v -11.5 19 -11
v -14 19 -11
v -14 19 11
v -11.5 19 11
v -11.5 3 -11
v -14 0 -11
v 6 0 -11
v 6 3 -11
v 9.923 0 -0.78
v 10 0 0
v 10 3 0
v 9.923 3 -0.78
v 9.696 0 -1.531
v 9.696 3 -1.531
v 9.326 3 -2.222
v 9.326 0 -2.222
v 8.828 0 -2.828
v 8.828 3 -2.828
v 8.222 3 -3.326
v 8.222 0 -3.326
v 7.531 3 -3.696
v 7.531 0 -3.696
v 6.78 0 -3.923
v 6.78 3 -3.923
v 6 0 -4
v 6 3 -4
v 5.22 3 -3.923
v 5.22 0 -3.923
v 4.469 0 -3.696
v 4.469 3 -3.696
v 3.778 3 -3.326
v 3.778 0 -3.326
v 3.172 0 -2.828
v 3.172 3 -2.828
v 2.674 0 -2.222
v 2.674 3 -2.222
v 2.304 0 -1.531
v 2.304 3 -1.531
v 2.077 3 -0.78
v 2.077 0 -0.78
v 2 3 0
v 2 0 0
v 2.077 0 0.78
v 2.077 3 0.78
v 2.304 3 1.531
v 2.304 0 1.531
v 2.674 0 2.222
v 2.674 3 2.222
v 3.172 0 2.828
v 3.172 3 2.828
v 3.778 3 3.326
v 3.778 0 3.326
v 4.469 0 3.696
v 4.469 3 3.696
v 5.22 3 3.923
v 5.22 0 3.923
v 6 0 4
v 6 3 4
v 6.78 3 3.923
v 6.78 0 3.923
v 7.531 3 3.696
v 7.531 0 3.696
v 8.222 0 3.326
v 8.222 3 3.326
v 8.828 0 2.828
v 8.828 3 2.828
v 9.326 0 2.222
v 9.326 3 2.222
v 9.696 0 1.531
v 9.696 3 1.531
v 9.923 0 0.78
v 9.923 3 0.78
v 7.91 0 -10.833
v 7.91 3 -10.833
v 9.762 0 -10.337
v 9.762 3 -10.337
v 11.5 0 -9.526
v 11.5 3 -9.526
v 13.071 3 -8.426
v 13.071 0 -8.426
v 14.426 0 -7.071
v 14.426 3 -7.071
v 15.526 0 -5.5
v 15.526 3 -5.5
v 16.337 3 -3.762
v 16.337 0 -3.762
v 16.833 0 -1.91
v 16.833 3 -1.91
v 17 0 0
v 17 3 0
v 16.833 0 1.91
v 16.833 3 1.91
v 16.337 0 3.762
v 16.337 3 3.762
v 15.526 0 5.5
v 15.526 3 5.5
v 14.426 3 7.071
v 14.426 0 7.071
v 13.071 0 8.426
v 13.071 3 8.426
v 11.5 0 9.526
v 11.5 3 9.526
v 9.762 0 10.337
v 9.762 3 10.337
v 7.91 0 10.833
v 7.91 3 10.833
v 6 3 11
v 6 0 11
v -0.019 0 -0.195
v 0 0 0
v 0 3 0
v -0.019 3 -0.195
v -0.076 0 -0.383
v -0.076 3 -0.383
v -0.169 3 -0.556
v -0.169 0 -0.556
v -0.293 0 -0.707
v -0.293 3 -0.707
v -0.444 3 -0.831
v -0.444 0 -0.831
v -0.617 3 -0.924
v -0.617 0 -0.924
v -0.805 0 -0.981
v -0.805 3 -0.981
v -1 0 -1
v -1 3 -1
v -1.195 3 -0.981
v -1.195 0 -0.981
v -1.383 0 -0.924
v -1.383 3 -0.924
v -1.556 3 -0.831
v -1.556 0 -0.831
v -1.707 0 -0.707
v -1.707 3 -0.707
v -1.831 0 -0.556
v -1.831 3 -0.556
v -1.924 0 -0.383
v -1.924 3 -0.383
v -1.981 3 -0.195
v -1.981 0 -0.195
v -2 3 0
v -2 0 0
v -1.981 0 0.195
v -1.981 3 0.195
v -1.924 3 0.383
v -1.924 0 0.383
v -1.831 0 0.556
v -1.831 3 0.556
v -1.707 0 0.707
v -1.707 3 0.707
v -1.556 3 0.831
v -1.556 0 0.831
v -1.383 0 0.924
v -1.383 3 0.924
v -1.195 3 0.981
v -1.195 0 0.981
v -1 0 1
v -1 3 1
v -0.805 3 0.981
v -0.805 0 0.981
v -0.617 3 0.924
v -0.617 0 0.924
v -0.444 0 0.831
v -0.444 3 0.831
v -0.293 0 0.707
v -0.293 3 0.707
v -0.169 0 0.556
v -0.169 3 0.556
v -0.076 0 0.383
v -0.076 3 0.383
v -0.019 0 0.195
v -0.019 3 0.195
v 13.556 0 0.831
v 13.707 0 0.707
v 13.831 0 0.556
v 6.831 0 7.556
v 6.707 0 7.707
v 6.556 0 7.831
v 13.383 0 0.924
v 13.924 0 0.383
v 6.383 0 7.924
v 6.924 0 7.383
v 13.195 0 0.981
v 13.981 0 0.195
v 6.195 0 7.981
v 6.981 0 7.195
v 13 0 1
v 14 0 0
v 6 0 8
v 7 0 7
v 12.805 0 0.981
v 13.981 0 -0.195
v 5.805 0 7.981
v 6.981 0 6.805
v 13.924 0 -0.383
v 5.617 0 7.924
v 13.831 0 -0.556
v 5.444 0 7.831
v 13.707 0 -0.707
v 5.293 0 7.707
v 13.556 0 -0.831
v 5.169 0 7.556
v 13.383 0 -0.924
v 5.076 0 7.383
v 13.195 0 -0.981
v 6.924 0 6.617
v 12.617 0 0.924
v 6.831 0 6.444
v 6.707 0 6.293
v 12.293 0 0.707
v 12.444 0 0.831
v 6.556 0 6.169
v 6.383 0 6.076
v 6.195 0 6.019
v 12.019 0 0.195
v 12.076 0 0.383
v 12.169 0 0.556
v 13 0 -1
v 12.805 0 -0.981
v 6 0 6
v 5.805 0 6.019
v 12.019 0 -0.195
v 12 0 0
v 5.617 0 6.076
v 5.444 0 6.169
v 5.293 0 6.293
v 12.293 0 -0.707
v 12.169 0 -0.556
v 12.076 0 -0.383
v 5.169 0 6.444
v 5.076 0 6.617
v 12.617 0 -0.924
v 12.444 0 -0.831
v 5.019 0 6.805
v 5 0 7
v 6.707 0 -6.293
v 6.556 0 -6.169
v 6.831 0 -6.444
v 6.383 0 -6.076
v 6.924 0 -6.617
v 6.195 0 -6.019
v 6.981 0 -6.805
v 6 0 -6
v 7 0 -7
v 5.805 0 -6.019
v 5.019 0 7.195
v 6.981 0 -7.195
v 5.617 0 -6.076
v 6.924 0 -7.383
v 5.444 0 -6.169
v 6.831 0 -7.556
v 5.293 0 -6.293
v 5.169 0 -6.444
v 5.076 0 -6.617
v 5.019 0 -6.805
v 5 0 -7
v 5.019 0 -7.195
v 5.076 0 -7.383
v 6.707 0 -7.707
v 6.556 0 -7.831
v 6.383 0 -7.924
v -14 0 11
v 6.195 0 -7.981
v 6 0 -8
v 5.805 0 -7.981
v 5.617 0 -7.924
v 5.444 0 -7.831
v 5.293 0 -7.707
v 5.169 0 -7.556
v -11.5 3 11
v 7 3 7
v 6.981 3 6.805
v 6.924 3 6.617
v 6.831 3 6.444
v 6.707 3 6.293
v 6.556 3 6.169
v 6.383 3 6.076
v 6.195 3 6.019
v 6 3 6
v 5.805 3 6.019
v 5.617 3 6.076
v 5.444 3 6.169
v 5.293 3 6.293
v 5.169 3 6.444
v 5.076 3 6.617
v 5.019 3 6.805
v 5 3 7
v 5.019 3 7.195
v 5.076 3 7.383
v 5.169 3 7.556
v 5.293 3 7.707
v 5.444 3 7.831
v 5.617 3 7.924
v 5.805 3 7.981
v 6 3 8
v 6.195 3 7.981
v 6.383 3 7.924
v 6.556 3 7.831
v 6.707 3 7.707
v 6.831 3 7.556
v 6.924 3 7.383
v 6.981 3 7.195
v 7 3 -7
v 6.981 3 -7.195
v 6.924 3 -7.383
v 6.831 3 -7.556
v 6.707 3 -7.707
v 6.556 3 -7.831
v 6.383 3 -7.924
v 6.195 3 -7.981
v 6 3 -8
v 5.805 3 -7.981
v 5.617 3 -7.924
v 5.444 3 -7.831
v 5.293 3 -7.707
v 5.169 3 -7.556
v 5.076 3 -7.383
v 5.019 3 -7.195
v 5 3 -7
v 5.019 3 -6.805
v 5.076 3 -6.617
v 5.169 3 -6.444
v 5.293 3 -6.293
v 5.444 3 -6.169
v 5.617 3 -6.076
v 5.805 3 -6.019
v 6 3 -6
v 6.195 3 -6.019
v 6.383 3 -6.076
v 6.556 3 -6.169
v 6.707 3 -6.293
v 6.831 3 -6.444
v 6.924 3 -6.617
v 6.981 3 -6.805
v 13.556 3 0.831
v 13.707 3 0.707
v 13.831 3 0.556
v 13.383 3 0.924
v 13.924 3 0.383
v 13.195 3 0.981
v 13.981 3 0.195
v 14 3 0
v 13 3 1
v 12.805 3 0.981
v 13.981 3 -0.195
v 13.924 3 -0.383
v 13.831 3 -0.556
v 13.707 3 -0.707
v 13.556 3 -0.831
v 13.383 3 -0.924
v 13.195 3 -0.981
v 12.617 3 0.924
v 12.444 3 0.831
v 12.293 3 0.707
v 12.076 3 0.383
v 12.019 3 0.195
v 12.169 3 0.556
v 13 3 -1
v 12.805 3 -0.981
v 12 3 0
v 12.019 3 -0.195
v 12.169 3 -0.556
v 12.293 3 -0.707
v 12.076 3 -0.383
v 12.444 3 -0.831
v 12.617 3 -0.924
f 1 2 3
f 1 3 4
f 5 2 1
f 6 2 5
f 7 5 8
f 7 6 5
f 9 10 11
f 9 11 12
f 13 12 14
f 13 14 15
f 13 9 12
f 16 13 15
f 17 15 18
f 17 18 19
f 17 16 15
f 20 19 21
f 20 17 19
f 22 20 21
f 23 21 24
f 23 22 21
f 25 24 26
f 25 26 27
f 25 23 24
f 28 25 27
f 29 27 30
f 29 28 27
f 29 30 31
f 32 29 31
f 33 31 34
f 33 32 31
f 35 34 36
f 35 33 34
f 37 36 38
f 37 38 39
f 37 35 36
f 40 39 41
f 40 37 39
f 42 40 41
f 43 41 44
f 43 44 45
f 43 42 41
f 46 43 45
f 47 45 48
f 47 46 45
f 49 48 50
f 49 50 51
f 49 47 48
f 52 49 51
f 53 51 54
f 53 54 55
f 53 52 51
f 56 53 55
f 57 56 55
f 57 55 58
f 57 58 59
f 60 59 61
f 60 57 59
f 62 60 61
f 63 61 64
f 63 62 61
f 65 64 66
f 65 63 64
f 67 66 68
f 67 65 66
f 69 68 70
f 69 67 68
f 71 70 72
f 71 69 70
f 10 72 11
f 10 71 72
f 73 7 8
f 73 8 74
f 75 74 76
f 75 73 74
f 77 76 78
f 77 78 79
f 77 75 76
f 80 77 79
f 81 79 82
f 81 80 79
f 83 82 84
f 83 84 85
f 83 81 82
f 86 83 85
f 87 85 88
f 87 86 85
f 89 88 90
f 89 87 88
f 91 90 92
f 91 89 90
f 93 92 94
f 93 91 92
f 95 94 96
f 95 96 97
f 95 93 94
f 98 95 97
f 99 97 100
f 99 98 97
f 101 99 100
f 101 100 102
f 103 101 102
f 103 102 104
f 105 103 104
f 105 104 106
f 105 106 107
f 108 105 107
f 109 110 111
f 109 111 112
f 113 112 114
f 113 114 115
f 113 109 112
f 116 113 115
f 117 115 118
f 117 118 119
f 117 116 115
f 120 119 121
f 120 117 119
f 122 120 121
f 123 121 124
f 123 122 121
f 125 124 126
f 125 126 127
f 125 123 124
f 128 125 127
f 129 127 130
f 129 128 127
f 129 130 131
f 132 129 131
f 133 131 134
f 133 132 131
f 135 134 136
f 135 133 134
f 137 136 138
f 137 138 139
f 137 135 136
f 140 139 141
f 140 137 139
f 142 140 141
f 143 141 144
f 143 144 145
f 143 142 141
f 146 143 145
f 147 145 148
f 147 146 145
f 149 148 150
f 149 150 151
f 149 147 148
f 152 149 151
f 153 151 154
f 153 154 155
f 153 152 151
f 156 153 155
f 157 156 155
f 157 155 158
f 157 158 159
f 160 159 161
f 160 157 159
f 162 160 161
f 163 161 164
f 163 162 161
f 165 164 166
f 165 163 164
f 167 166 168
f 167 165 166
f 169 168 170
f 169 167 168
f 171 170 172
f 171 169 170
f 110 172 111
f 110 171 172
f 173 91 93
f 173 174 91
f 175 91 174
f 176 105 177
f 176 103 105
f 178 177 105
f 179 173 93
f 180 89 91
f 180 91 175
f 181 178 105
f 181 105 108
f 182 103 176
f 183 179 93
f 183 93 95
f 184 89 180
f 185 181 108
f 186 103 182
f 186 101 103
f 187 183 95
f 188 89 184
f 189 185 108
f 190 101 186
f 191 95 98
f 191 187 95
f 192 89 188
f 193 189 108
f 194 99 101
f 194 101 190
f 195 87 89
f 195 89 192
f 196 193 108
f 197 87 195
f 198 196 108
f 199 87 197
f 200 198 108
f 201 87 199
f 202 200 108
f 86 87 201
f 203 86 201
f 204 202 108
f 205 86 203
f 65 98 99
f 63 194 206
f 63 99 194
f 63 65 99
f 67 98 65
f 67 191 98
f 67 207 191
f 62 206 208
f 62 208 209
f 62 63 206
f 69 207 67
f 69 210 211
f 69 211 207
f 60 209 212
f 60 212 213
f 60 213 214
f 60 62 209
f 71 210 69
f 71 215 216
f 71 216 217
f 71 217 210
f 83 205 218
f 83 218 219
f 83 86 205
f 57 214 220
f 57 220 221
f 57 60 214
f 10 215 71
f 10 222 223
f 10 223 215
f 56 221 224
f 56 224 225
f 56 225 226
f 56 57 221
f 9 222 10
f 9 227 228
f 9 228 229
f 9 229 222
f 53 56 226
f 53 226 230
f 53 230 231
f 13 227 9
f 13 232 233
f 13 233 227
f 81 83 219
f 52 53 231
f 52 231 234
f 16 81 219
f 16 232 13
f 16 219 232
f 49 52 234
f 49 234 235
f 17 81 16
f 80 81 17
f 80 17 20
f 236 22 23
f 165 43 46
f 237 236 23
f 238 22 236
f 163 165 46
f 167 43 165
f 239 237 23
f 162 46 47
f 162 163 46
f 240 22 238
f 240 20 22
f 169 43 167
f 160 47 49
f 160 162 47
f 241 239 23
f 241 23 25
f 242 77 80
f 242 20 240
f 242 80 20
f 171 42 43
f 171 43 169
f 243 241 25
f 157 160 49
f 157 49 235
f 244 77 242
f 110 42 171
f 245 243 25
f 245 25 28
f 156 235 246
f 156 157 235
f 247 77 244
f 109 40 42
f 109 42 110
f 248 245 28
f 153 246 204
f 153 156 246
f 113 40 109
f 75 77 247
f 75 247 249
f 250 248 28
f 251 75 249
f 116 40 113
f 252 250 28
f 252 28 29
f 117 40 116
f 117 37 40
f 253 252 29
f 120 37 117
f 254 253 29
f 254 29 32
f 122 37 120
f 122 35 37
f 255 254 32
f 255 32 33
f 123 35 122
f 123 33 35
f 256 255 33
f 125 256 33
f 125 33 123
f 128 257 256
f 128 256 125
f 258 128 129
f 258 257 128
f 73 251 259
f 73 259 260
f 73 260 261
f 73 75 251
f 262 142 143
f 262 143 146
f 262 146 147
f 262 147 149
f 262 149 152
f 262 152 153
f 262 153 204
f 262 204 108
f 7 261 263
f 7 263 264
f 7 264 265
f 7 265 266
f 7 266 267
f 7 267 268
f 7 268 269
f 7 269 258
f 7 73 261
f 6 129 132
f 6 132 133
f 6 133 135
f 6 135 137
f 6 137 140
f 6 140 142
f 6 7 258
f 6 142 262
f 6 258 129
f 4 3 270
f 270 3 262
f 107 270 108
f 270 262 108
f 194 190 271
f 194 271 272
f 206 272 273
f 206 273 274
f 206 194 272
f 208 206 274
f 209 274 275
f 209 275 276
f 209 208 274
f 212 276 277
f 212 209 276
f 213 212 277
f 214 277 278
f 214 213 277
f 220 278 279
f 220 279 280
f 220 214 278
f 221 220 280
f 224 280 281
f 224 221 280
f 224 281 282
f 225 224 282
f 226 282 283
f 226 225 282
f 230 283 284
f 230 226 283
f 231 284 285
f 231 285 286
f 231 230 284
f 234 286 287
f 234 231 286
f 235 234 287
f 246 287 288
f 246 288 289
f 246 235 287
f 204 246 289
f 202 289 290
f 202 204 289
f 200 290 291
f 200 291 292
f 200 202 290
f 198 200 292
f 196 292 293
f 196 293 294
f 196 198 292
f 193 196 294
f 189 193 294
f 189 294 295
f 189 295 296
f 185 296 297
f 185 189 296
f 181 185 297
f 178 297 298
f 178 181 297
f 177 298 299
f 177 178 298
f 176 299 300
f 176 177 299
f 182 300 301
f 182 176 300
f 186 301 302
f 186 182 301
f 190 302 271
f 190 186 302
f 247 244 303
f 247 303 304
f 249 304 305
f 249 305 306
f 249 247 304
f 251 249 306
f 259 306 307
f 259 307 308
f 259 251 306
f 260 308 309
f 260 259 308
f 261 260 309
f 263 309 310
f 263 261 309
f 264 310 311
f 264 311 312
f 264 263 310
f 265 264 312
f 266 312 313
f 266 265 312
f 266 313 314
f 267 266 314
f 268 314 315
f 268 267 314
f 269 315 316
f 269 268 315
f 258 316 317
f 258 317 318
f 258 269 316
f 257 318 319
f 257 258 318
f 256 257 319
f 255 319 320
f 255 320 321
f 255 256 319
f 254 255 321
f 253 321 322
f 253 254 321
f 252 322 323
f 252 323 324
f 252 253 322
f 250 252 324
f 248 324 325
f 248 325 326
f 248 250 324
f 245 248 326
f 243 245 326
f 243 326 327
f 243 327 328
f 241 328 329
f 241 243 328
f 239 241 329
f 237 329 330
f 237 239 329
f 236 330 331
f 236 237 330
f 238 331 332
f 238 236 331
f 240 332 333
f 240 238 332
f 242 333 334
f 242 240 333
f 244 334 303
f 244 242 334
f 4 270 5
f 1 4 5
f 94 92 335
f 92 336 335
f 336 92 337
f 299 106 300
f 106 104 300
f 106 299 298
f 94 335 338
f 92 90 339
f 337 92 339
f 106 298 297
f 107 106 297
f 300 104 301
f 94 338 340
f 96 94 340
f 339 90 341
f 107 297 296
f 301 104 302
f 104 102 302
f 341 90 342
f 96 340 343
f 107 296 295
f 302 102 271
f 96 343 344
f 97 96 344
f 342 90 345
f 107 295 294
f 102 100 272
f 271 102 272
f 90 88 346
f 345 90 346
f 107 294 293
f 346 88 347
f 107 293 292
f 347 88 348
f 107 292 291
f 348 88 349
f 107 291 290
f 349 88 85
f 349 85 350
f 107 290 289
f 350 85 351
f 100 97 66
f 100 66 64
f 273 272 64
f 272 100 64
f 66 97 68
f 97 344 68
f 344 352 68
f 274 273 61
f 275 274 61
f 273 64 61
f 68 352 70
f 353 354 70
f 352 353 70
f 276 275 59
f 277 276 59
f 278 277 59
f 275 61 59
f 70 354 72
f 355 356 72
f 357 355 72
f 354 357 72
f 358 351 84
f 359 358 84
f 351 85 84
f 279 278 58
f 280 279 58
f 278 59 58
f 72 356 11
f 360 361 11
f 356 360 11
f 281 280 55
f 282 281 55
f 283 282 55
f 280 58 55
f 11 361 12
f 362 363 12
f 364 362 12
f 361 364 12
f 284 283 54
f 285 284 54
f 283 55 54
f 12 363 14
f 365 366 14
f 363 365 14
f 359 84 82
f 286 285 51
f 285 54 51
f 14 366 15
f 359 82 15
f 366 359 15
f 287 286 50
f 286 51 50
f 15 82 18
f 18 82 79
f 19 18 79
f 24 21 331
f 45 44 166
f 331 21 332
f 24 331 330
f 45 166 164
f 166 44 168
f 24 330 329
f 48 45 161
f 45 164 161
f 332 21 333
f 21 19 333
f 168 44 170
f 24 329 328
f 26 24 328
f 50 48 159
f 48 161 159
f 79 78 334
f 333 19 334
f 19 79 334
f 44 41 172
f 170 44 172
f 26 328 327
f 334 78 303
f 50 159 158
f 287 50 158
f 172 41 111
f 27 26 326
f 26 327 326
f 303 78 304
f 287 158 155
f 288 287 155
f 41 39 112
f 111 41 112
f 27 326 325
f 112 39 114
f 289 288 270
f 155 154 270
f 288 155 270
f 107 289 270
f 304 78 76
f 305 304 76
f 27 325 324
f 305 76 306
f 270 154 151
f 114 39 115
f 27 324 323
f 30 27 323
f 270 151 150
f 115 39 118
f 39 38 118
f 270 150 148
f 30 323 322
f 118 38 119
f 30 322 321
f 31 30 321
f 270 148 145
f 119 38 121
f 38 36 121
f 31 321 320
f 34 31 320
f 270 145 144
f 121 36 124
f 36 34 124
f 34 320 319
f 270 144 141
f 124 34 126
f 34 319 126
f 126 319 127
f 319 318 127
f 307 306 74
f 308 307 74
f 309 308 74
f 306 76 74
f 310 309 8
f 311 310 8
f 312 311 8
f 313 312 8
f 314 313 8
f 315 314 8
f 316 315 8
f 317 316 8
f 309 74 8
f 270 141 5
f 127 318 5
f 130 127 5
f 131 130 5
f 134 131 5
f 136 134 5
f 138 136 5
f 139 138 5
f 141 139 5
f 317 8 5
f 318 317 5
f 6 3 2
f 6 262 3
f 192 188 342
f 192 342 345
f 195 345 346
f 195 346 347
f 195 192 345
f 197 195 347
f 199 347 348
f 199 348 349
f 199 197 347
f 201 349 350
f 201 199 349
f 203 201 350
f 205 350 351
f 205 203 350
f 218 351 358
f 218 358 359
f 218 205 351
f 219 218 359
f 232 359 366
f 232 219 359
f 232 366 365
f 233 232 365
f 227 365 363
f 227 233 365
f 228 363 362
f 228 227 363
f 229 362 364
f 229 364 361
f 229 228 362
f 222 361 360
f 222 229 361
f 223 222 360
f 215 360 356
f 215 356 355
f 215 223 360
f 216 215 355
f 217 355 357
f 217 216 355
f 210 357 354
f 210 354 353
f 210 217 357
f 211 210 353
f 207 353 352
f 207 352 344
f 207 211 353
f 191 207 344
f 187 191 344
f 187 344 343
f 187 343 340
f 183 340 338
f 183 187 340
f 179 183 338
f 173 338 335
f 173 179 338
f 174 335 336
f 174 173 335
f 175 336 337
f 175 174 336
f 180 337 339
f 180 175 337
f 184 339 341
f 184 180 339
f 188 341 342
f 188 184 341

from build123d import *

# Parameters (mm, degrees)
SKETCH1_R           = 1
SKETCH1_R_2         = 4
BOSS_EXTRUDE1_DEPTH = 3
SKETCH2_W           = 2.5
SKETCH2_H           = 22
BOSS_EXTRUDE2_DEPTH = 16


with BuildPart() as part:
    # Sketch1 → Boss-Extrude1 (new body)
    with BuildSketch(Plane(origin=(0, 0, 0), x_dir=(1, 0, 0), z_dir=(0, 1, 0))):
        with BuildLine():
            Line((-14, -11), (-14, 11))
            Line((-14, 11), (6, 11))
            ThreePointArc((6, 11), (17, 0), (6, -11))
            Line((6, -11), (-14, -11))
        make_face()
        with Locations((6, -7)):
            Circle(SKETCH1_R, mode=Mode.SUBTRACT)
        with Locations((-1, 0)):
            Circle(SKETCH1_R, mode=Mode.SUBTRACT)
        with Locations((6, 0)):
            Circle(SKETCH1_R_2, mode=Mode.SUBTRACT)
        with Locations((13, 0)):
            Circle(SKETCH1_R, mode=Mode.SUBTRACT)
        with Locations((6, 7)):
            Circle(SKETCH1_R, mode=Mode.SUBTRACT)
    extrude(amount=BOSS_EXTRUDE1_DEPTH)

    # Sketch2 → Boss-Extrude2 (add)
    with BuildSketch(Plane(origin=(0, 3, 0), x_dir=(1, 0, 0), z_dir=(0, 1, 0))):
        with Locations((-12.75, 0)):
            Rectangle(SKETCH2_W, SKETCH2_H)
    extrude(amount=BOSS_EXTRUDE2_DEPTH)


solid = part.part
